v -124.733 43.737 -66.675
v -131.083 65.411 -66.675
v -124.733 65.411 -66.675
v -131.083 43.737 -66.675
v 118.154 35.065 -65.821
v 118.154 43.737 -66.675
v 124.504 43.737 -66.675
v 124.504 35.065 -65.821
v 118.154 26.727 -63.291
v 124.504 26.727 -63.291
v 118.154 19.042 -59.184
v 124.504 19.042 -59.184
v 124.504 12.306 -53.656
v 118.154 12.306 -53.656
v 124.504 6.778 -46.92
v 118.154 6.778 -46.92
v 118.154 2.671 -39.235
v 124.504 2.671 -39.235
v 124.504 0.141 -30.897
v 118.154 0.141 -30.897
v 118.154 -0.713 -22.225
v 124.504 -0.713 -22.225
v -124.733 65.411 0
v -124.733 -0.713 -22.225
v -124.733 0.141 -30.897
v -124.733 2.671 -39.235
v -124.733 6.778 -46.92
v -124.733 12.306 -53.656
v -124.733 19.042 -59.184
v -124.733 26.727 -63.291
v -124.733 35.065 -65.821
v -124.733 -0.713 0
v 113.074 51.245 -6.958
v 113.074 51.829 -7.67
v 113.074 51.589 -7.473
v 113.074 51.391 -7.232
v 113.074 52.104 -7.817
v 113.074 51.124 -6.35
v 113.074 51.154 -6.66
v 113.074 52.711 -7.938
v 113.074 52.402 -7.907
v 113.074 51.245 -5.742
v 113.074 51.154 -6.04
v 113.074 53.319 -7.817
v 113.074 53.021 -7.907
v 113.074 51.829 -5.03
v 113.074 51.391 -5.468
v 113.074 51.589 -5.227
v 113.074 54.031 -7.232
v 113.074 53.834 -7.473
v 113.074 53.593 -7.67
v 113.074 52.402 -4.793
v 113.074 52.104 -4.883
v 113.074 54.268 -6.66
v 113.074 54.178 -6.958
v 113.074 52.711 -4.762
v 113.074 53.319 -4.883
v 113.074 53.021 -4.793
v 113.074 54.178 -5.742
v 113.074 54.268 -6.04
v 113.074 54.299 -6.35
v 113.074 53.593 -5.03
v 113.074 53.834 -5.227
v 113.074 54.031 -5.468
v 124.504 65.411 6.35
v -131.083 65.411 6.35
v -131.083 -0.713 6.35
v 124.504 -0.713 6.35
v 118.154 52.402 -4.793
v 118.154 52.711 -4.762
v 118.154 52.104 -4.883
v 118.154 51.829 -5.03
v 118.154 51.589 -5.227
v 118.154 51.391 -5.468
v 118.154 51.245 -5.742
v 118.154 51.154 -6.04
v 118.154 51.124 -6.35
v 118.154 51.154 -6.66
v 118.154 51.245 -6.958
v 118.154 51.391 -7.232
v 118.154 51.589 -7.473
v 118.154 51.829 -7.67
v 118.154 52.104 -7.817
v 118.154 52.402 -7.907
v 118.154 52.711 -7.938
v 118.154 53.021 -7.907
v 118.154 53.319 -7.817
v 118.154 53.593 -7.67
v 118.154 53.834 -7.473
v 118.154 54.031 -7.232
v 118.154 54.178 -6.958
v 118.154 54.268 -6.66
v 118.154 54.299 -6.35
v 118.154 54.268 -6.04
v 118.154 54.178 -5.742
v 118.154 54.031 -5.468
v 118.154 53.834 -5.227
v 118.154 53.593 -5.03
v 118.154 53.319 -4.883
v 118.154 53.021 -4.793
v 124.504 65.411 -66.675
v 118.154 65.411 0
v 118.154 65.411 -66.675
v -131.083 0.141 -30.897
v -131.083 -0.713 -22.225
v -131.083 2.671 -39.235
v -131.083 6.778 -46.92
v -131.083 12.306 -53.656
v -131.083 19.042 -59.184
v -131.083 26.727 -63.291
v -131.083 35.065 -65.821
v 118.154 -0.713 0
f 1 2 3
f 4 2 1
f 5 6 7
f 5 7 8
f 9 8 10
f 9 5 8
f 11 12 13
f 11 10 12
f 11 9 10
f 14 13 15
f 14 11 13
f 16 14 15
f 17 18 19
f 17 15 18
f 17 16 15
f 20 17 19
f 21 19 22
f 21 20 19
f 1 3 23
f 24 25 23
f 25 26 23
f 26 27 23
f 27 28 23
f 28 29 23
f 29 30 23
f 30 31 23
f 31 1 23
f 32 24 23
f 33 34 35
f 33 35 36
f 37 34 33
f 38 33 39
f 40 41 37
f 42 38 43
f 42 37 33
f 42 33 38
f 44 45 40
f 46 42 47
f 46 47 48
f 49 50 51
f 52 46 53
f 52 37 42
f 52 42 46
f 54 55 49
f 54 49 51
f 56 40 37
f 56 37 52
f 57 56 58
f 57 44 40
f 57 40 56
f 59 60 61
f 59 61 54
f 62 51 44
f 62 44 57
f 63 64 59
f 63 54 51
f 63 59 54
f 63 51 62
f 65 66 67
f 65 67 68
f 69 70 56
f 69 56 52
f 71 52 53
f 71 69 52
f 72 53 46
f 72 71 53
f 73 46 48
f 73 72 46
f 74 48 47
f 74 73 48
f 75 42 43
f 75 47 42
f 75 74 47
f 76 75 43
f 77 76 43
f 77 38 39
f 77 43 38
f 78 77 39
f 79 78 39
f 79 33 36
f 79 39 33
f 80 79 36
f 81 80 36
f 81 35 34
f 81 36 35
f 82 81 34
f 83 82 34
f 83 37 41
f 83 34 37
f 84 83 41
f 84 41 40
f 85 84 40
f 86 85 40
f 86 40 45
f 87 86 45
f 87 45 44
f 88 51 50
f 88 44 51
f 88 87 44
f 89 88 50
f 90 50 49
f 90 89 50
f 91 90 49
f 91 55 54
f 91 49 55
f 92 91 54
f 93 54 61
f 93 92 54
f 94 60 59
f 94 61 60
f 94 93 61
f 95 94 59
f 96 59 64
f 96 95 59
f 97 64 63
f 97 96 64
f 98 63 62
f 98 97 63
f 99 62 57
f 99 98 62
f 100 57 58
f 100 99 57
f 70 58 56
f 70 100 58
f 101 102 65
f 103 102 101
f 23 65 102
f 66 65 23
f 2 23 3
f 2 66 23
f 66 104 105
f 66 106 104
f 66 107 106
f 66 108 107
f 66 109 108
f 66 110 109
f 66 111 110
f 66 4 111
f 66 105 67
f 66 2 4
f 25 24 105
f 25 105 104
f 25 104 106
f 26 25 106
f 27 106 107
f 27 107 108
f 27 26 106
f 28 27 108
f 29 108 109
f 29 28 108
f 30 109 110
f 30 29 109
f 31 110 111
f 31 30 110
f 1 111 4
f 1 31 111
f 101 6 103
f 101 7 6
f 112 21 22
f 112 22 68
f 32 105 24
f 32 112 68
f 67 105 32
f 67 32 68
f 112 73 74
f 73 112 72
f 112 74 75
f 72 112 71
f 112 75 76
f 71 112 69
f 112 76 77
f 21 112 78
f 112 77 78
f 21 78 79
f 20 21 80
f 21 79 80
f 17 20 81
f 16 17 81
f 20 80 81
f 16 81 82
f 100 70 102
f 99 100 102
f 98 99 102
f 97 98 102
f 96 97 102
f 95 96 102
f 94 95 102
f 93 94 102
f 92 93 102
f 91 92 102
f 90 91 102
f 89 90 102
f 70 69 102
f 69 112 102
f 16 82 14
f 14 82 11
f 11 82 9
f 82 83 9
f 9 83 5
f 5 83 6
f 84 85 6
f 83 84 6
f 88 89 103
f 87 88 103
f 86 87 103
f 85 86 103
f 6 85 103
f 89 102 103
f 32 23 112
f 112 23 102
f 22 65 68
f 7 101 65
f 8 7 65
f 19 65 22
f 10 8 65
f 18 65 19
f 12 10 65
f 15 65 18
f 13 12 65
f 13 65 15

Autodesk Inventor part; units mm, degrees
ref_plane "YZ Plane" through (0, 0, 0) normal (1, 0, 0) x (0, 1, 0)
ref_plane "XZ Plane" through (0, 0, 0) normal (0, 1, 0) x (-1, 0, 0)
ref_plane "XY Plane" through (0, 0, 0) normal (0, 0, 1) x (1, 0, 0)
sketch "Sketch1" plane through (0, 0, 0) normal (0, 0, 1) x (1, 0, 0)
  line L0 (-131.0833, 65.4113) -> (124.5042, 65.4113)
  line L1 (124.5042, 65.4113) -> (124.5042, -0.7128)
  line L2 (124.5042, -0.7128) -> (-131.0833, -0.7128)
  line L3 (-131.0833, -0.7128) -> (-131.0833, 65.4113)
  point P0 (0, 0)
extrude "Extrusion1" add sketch "Sketch1" along normal blind 6.35
ref_plane "Work Plane2" through (124.5042, 65.4113, 3.175) normal (1, 0, 0) x (0, 0, -1)
sketch "Sketch4" plane through (124.5042, 65.4113, 3.175) normal (1, 0, 0) x (0, 0, -1)
  line L0 (3.175, -66.1241) -> (3.175, 0) projected
  line L1 (3.175, -66.1241) -> (69.85, -66.1241)
  line L2 (69.85, -66.1241) -> (69.85, 0)
  line L3 (69.85, 0) -> (3.175, 0)
  line L4 (3.175, 0) -> (3.175, -66.1241)
  point P0 (3.175, -65.4113)
  dimension "d2" = 66.1241
  dimension "d3" = 66.675
extrude "Extrusion2" add sketch "Sketch4" against normal blind 6.35
fillet "Fillet1" radius 44.45 1 edges at (121.3292, -0.7128, -66.675)
ref_plane "Work Plane3" through (-131.0833, -0.7128, 0) normal (-1, 0, 0) x (0, 0, 1)
sketch "Sketch5" plane through (-131.0833, -0.7128, 0) normal (-1, 0, 0) x (0, 0, 1)
  line L0 (0, 66.1241) -> (-66.675, 66.1241) projected
  line L1 (0, 66.1241) -> (-66.675, 66.1241)
  line L2 (-66.675, 66.1241) -> (-66.675, 0)
  line L3 (-66.675, 0) -> (0, 0)
  line L4 (0, 0) -> (0, 66.1241)
  point P0 (0, 0.7128)
extrude "Extrusion3" add sketch "Sketch5" against normal blind 6.35
fillet "Fillet2" radius 44.45 1 edges at (-127.9083, -0.7128, -66.675)
ref_plane "Work Plane4" through (118.1542, 65.4113, -66.675) normal (-1, 0, 0) x (0, 0, 1)
sketch "Sketch6" plane through (118.1542, 65.4113, -66.675) normal (-1, 0, 0) x (0, 0, 1)
  circle A0 centre (60.325, -12.7) radius 1.5875
  point P0 (66.675, -65.4113)
  dimension "d11" = 3.175
extrude "Extrusion4" add sketch "Sketch6" along normal blind 5.08
properties part number "Top Basic layout"
